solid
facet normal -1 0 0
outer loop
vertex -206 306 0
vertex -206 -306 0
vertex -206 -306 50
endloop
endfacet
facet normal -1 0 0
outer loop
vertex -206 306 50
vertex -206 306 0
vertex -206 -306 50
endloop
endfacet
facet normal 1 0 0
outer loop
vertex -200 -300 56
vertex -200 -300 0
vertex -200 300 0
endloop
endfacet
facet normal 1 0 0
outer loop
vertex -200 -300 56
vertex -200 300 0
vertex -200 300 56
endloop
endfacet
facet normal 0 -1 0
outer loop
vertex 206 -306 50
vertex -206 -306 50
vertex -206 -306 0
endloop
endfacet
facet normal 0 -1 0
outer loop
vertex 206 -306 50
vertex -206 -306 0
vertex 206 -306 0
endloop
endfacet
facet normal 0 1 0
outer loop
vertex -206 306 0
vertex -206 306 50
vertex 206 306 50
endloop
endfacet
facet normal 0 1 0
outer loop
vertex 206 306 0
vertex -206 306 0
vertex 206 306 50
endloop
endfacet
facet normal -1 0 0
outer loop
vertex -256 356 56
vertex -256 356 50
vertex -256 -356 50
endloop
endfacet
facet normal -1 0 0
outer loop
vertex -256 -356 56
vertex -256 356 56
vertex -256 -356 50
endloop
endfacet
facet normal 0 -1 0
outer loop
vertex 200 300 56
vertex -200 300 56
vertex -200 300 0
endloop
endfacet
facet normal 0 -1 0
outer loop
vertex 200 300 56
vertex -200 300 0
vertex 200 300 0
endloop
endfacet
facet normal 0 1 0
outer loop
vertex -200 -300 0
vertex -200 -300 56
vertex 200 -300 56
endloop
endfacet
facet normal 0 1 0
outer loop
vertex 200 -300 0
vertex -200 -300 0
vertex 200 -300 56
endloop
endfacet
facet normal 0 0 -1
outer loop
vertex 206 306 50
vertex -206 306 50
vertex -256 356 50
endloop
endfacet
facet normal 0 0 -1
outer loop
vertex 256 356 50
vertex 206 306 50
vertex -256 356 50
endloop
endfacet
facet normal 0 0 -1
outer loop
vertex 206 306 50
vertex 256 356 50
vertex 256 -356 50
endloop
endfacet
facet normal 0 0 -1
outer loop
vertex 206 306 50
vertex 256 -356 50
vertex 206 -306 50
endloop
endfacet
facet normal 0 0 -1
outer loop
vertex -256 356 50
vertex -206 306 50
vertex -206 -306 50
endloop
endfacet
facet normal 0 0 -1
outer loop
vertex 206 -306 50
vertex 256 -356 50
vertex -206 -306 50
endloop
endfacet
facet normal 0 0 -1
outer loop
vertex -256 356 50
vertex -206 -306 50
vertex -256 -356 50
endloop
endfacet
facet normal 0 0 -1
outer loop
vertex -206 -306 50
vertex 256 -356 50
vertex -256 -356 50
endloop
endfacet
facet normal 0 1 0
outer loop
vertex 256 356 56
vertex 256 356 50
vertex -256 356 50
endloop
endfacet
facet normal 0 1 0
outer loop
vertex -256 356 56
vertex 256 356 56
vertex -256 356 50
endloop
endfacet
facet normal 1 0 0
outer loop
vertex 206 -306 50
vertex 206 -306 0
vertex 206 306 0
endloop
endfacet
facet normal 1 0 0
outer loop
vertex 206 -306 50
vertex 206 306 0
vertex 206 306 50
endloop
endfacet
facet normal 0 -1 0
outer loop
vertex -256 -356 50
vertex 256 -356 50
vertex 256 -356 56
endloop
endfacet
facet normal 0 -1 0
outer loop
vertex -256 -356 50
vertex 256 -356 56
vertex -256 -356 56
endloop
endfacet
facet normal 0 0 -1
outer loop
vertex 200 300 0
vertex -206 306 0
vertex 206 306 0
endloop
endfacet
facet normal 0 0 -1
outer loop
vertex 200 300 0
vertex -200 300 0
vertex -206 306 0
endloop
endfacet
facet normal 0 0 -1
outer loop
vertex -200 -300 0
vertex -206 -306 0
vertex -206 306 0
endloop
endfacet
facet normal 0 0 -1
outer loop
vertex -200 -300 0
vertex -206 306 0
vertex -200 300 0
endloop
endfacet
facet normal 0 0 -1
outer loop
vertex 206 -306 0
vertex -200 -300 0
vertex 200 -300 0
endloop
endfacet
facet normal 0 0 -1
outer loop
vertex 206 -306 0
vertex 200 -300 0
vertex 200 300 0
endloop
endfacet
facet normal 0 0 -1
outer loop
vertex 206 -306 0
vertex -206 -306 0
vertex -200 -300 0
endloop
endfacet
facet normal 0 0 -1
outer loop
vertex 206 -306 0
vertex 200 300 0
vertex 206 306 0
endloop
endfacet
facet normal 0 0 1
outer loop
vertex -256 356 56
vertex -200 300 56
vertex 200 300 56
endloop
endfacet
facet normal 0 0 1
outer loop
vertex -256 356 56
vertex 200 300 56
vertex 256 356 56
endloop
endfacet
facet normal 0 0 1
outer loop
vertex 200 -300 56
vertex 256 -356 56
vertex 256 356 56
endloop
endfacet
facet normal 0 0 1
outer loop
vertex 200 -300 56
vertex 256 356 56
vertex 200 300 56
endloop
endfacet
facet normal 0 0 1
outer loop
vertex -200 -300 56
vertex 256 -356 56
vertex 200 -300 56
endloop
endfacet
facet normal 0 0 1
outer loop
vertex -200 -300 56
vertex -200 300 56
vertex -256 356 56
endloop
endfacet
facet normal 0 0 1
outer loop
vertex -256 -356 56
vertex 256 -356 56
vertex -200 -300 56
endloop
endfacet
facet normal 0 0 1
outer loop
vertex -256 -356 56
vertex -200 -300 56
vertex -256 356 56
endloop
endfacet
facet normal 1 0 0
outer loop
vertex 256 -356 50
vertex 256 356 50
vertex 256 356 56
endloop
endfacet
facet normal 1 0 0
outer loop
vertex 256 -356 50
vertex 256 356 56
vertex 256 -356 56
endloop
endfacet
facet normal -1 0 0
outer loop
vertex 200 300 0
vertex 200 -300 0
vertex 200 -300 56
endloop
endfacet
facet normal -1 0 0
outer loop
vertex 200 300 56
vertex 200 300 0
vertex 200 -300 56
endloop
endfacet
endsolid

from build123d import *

# Parameters (mm, degrees)
SKETCH049_W  = 400
SKETCH049_H  = 60
PAD_DEPTH    = 300
SKETCH050_W  = 412
SKETCH050_H  = 50
PAD001_DEPTH = 306
SKETCH051_W  = 512
SKETCH051_H  = 712
PAD002_DEPTH = 6


with BuildPart() as body:
    # Sketch049 → Pad (new body, symmetric)
    with BuildSketch(Plane.XZ):
        with Locations((0, 30)):
            Rectangle(SKETCH049_W, SKETCH049_H)
    extrude(amount=PAD_DEPTH, both=True)


with BuildPart() as cut006:
    # Sketch050 → Pad001 (new body, symmetric)
    with BuildSketch(Plane.XZ):
        with Locations((0, 25)):
            Rectangle(SKETCH050_W, SKETCH050_H)
    extrude(amount=PAD001_DEPTH, both=True)

    # Sketch051 (on Face3 of Pad001) → Pad002 (join)
    with BuildSketch(Plane(origin=(0, 0, 50), x_dir=(-1, 0, 0), z_dir=(0, 0, 1))):
        Rectangle(SKETCH051_W, SKETCH051_H)
    extrude(amount=PAD002_DEPTH)

    # Cut006: cut Body
    add(body.part, mode=Mode.SUBTRACT)


solid = cut006.part
